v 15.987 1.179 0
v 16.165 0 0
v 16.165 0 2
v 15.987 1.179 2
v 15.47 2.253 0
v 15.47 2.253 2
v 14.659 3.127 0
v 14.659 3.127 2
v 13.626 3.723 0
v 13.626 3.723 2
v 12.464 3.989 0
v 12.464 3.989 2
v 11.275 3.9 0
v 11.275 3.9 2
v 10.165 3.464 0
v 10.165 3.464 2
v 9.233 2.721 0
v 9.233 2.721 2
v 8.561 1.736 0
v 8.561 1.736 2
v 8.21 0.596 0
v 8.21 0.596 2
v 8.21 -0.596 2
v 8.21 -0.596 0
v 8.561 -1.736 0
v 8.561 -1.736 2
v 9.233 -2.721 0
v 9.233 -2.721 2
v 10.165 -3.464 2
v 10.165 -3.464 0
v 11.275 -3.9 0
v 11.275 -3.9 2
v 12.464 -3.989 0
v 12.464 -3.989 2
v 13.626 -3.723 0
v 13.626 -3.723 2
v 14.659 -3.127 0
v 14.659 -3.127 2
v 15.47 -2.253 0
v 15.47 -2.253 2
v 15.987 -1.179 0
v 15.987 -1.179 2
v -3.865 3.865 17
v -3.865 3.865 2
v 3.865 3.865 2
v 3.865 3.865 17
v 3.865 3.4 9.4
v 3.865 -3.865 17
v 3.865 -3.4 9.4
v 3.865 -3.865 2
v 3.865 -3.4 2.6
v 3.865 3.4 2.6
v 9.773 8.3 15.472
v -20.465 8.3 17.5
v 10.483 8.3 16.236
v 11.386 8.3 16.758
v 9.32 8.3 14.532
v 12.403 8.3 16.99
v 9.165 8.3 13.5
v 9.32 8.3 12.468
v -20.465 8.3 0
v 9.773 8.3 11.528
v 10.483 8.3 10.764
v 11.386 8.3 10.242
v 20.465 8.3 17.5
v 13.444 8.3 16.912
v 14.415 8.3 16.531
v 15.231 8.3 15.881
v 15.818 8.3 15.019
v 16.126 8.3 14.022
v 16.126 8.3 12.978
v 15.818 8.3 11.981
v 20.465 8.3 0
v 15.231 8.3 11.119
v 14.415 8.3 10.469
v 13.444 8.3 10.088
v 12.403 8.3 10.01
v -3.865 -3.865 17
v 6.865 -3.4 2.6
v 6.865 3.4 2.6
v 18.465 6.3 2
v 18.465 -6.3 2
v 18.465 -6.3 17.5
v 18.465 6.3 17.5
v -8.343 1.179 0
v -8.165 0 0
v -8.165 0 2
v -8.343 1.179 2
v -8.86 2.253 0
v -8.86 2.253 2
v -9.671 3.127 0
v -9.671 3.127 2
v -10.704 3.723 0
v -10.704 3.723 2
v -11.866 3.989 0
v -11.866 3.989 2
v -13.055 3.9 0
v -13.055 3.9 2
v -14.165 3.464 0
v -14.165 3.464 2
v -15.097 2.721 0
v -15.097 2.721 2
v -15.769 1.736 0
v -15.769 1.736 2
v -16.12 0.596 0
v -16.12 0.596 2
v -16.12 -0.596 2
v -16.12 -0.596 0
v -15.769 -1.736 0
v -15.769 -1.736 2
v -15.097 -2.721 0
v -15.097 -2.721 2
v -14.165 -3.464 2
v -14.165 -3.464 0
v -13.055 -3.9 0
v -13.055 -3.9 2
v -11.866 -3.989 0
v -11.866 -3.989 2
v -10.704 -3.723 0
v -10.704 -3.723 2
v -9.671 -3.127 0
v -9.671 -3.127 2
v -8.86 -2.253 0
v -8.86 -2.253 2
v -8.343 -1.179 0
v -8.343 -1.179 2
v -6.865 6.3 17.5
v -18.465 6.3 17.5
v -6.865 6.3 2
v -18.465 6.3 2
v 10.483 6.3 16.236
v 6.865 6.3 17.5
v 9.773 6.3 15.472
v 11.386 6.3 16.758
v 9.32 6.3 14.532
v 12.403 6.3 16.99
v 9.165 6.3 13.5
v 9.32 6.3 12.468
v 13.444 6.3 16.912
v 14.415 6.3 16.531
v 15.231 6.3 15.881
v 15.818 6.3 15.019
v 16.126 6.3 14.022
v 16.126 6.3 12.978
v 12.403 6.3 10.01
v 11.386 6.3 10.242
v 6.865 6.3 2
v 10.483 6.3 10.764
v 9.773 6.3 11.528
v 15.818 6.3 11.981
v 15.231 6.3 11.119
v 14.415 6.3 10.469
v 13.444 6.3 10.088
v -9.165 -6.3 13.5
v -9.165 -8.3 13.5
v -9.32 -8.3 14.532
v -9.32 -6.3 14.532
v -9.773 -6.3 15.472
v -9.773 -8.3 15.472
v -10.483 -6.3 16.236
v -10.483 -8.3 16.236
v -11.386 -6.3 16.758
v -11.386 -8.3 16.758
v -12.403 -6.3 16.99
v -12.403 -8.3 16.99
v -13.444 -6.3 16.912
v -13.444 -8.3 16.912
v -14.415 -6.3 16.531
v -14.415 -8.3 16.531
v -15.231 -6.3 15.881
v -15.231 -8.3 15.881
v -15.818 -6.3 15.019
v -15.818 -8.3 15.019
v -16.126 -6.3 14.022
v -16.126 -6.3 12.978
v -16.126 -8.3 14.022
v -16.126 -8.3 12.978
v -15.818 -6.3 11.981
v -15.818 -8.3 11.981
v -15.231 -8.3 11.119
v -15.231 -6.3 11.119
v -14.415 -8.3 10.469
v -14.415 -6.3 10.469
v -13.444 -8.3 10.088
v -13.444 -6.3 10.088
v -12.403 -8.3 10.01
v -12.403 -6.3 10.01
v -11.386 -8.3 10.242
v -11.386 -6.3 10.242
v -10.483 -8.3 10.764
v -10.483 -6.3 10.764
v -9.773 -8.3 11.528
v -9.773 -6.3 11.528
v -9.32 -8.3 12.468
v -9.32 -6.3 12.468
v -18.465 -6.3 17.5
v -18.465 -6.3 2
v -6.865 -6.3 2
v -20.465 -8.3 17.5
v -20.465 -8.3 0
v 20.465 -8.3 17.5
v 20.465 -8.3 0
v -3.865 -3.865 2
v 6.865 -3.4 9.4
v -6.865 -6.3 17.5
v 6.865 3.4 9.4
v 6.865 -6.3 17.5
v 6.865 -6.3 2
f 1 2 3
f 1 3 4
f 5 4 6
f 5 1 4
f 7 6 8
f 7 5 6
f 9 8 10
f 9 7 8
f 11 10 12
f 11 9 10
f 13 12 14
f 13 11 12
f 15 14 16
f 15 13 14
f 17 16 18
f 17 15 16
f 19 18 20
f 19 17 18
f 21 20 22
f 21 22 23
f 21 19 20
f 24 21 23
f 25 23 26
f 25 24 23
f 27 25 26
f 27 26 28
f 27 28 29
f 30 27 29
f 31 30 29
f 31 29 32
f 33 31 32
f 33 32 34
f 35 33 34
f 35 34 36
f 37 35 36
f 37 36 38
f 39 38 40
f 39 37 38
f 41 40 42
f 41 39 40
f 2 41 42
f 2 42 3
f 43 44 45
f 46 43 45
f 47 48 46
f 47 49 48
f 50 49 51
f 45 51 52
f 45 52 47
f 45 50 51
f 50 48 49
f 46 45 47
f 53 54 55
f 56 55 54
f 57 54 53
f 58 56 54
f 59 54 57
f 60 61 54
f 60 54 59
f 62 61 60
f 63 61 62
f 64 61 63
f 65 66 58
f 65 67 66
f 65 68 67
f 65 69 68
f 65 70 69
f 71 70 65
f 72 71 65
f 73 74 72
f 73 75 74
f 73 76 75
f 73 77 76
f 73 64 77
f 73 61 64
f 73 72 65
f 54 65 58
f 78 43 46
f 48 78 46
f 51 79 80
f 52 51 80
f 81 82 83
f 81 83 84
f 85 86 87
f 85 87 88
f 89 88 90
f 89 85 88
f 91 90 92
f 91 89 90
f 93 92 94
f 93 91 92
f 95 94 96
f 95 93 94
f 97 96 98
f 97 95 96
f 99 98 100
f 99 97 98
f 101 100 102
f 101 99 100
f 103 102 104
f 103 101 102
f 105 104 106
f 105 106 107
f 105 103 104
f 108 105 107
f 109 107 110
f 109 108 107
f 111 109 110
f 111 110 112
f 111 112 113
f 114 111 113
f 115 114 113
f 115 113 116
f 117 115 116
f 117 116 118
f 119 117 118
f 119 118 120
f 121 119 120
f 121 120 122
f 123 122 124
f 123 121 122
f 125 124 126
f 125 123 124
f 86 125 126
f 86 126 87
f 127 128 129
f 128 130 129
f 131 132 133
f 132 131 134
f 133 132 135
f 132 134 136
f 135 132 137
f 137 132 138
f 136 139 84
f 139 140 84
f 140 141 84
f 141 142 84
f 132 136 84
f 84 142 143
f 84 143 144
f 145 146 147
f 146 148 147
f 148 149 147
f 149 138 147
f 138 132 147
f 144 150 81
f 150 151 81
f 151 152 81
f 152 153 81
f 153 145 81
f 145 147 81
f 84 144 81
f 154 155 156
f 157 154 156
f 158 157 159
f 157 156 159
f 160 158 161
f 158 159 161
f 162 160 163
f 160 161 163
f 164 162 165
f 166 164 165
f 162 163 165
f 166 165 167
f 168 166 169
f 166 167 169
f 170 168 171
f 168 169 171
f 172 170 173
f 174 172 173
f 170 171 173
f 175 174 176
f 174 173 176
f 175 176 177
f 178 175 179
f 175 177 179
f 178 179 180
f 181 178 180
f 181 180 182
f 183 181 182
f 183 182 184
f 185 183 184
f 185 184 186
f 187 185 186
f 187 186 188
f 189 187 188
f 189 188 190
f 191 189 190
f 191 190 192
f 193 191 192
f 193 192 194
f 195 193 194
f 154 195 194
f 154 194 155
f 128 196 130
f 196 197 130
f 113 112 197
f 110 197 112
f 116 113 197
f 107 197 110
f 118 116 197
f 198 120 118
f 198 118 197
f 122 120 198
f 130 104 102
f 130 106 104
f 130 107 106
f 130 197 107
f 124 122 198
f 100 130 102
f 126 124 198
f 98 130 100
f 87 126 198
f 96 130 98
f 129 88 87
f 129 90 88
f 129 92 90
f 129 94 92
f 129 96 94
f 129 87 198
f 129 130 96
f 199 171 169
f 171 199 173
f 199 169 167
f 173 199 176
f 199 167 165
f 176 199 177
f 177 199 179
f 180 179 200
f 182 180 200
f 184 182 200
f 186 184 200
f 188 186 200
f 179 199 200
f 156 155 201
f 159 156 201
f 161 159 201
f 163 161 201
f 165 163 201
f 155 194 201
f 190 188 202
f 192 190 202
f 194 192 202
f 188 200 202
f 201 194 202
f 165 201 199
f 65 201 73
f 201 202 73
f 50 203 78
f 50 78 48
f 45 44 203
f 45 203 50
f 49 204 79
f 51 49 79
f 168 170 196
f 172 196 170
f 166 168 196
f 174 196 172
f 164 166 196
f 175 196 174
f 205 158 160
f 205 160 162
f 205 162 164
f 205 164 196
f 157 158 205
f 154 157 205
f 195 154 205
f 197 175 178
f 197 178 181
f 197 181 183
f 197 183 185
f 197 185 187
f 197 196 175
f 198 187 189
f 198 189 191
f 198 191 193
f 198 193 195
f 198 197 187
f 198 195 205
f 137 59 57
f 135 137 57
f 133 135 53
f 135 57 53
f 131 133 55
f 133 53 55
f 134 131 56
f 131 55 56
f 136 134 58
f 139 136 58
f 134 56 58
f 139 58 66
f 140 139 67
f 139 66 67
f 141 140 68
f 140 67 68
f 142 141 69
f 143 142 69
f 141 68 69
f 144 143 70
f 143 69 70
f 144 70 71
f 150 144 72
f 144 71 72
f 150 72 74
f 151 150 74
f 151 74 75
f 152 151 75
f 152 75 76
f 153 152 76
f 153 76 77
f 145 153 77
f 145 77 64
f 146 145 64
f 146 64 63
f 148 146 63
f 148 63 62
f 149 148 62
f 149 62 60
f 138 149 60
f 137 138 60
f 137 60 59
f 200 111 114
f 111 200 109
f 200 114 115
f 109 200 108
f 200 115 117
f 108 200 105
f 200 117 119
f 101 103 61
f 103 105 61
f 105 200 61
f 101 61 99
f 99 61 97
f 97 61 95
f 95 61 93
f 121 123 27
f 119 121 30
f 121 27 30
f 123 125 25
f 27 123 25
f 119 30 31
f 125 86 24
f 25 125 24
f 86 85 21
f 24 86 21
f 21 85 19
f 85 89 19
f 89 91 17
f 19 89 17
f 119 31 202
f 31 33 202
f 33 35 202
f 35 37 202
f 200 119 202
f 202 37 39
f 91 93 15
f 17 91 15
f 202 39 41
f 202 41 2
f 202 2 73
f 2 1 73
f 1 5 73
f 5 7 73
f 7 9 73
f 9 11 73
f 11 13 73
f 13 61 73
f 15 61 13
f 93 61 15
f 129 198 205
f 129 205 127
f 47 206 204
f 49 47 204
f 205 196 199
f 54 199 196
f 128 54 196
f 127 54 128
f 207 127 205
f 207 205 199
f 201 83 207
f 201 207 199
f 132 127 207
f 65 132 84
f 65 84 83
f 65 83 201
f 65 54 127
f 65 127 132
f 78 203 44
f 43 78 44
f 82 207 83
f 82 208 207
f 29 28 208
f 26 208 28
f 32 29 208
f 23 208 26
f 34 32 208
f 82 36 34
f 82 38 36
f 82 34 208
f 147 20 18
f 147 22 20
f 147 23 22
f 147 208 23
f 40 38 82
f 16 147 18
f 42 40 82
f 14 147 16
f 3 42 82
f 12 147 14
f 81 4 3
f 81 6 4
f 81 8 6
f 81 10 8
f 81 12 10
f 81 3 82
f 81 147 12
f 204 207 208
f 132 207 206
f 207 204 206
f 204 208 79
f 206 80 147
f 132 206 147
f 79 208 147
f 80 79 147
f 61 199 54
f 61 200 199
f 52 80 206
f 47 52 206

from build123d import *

# Parameters (mm, degrees)
F0_W      = 40.93
F0_H      = 16.6
F0_W_2    = 7.73
F0_H_2    = 7.73
F0_W_3    = 10.6
F0_H_3    = 10.6
F0_R      = 4
F0_W_4    = 6.33
F0_H_4    = 6.33
F1_DEPTH  = 2
F2_W      = 40.93
F2_H      = 16.6
F2_W_2    = 11.6
F2_H_2    = 12.6
F2_W_3    = 7.73
F2_H_3    = 7.73
F3_DEPTH  = 15
F4_W      = 40.93
F4_H      = 16.6
F4_W_2    = 11.6
F4_H_2    = 12.6
F4_W_3    = 7.73
F4_H_3    = 7.73
F5_DEPTH  = 0.5
F7_DEPTH  = 4
F8_R      = 3.5
F9_DEPTH  = 3
F10_R     = 3.5
F11_DEPTH = 3


with BuildPart() as f1:
    # F0 (on Top) → F1 (new body)
    with BuildSketch(Plane.XY):
        Rectangle(F0_W, F0_H)
        Polygon((-6.865, 6.3), (-6.865, 6.865), (6.865, 6.865), (6.865, 6.3), (18.465, 6.3), (18.465, -6.3), (6.865, -6.3), (6.865, -6.865), (-6.865, -6.865), (-6.865, -6.3), (-18.465, -6.3), (-18.465, 6.3), align=None, mode=Mode.SUBTRACT)
        Polygon((6.865, 6.865), (-6.865, 6.865), (-6.865, 6.3), (-6.865, 5.3), (-6.865, -5.3), (-6.865, -6.3), (-6.865, -6.865), (6.865, -6.865), (6.865, -6.3), (6.865, -5.3), (6.865, 5.3), (6.865, 6.3), align=None)
        Rectangle(F0_W_2, F0_H_2, mode=Mode.SUBTRACT)
        with Locations((12.165, 0)):
            Rectangle(F0_W_3, F0_H_3)
        with Locations((12.165, 0)):
            Circle(F0_R, mode=Mode.SUBTRACT)
        with Locations((-12.165, 0)):
            Rectangle(F0_W_3, F0_H_3)
        with Locations((-12.165, 0)):
            Circle(F0_R, mode=Mode.SUBTRACT)
        Rectangle(F0_W_2, F0_H_2)
        Rectangle(F0_W_4, F0_H_4, mode=Mode.SUBTRACT)
        Rectangle(F0_W_4, F0_H_4)
        Polygon((-6.865, 5.3), (-6.865, 6.3), (-18.465, 6.3), (-18.465, -6.3), (-6.865, -6.3), (-6.865, -5.3), (-17.465, -5.3), (-17.465, 5.3), align=None)
        Polygon((18.465, 6.3), (6.865, 6.3), (6.865, 5.3), (17.465, 5.3), (17.465, -5.3), (6.865, -5.3), (6.865, -6.3), (18.465, -6.3), align=None)
    extrude(amount=F1_DEPTH)

    # F2 (on face) → F3 (join)
    with BuildSketch(Plane.XY.offset(2)):
        Rectangle(F2_W, F2_H)
        with Locations((-12.665, 0)):
            Rectangle(F2_W_2, F2_H_2, mode=Mode.SUBTRACT)
        Rectangle(F2_W_3, F2_H_3, mode=Mode.SUBTRACT)
        with Locations((12.665, 0)):
            Rectangle(F2_W_2, F2_H_2, mode=Mode.SUBTRACT)
    extrude(amount=F3_DEPTH)

    # F4 (on face) → F5 (join)
    with BuildSketch(Plane.XY.offset(17)):
        Rectangle(F4_W, F4_H)
        with Locations((-12.665, 0)):
            Rectangle(F4_W_2, F4_H_2, mode=Mode.SUBTRACT)
        Rectangle(F4_W_3, F4_H_3, mode=Mode.SUBTRACT)
        with Locations((12.665, 0)):
            Rectangle(F4_W_2, F4_H_2, mode=Mode.SUBTRACT)
        Rectangle(F4_W_3, F4_H_3)
    extrude(amount=F5_DEPTH)

    # F6 (on face) → F7 (cut)
    with BuildSketch(Plane.YZ.offset(6.865)):
        Polygon((0, 9.4), (-3.4, 9.4), (-3.4, 2.6), (3.4, 2.6), (3.4, 9.4), align=None)
    extrude(amount=-F7_DEPTH, mode=Mode.SUBTRACT)

    # F8 (on face) → F9 (cut)
    with BuildSketch(Plane(origin=(0, 8.3, 0), x_dir=(-1, 0, 0), z_dir=(0, 1, 0))):
        with Locations((-12.665, 13.5)):
            Circle(F8_R)
    extrude(amount=-F9_DEPTH, mode=Mode.SUBTRACT)

    # F10 (on face) → F11 (cut)
    with BuildSketch(Plane.XZ.offset(8.3)):
        with Locations((-12.665, 13.5)):
            Circle(F10_R)
    extrude(amount=-F11_DEPTH, mode=Mode.SUBTRACT)


solid = f1.part
